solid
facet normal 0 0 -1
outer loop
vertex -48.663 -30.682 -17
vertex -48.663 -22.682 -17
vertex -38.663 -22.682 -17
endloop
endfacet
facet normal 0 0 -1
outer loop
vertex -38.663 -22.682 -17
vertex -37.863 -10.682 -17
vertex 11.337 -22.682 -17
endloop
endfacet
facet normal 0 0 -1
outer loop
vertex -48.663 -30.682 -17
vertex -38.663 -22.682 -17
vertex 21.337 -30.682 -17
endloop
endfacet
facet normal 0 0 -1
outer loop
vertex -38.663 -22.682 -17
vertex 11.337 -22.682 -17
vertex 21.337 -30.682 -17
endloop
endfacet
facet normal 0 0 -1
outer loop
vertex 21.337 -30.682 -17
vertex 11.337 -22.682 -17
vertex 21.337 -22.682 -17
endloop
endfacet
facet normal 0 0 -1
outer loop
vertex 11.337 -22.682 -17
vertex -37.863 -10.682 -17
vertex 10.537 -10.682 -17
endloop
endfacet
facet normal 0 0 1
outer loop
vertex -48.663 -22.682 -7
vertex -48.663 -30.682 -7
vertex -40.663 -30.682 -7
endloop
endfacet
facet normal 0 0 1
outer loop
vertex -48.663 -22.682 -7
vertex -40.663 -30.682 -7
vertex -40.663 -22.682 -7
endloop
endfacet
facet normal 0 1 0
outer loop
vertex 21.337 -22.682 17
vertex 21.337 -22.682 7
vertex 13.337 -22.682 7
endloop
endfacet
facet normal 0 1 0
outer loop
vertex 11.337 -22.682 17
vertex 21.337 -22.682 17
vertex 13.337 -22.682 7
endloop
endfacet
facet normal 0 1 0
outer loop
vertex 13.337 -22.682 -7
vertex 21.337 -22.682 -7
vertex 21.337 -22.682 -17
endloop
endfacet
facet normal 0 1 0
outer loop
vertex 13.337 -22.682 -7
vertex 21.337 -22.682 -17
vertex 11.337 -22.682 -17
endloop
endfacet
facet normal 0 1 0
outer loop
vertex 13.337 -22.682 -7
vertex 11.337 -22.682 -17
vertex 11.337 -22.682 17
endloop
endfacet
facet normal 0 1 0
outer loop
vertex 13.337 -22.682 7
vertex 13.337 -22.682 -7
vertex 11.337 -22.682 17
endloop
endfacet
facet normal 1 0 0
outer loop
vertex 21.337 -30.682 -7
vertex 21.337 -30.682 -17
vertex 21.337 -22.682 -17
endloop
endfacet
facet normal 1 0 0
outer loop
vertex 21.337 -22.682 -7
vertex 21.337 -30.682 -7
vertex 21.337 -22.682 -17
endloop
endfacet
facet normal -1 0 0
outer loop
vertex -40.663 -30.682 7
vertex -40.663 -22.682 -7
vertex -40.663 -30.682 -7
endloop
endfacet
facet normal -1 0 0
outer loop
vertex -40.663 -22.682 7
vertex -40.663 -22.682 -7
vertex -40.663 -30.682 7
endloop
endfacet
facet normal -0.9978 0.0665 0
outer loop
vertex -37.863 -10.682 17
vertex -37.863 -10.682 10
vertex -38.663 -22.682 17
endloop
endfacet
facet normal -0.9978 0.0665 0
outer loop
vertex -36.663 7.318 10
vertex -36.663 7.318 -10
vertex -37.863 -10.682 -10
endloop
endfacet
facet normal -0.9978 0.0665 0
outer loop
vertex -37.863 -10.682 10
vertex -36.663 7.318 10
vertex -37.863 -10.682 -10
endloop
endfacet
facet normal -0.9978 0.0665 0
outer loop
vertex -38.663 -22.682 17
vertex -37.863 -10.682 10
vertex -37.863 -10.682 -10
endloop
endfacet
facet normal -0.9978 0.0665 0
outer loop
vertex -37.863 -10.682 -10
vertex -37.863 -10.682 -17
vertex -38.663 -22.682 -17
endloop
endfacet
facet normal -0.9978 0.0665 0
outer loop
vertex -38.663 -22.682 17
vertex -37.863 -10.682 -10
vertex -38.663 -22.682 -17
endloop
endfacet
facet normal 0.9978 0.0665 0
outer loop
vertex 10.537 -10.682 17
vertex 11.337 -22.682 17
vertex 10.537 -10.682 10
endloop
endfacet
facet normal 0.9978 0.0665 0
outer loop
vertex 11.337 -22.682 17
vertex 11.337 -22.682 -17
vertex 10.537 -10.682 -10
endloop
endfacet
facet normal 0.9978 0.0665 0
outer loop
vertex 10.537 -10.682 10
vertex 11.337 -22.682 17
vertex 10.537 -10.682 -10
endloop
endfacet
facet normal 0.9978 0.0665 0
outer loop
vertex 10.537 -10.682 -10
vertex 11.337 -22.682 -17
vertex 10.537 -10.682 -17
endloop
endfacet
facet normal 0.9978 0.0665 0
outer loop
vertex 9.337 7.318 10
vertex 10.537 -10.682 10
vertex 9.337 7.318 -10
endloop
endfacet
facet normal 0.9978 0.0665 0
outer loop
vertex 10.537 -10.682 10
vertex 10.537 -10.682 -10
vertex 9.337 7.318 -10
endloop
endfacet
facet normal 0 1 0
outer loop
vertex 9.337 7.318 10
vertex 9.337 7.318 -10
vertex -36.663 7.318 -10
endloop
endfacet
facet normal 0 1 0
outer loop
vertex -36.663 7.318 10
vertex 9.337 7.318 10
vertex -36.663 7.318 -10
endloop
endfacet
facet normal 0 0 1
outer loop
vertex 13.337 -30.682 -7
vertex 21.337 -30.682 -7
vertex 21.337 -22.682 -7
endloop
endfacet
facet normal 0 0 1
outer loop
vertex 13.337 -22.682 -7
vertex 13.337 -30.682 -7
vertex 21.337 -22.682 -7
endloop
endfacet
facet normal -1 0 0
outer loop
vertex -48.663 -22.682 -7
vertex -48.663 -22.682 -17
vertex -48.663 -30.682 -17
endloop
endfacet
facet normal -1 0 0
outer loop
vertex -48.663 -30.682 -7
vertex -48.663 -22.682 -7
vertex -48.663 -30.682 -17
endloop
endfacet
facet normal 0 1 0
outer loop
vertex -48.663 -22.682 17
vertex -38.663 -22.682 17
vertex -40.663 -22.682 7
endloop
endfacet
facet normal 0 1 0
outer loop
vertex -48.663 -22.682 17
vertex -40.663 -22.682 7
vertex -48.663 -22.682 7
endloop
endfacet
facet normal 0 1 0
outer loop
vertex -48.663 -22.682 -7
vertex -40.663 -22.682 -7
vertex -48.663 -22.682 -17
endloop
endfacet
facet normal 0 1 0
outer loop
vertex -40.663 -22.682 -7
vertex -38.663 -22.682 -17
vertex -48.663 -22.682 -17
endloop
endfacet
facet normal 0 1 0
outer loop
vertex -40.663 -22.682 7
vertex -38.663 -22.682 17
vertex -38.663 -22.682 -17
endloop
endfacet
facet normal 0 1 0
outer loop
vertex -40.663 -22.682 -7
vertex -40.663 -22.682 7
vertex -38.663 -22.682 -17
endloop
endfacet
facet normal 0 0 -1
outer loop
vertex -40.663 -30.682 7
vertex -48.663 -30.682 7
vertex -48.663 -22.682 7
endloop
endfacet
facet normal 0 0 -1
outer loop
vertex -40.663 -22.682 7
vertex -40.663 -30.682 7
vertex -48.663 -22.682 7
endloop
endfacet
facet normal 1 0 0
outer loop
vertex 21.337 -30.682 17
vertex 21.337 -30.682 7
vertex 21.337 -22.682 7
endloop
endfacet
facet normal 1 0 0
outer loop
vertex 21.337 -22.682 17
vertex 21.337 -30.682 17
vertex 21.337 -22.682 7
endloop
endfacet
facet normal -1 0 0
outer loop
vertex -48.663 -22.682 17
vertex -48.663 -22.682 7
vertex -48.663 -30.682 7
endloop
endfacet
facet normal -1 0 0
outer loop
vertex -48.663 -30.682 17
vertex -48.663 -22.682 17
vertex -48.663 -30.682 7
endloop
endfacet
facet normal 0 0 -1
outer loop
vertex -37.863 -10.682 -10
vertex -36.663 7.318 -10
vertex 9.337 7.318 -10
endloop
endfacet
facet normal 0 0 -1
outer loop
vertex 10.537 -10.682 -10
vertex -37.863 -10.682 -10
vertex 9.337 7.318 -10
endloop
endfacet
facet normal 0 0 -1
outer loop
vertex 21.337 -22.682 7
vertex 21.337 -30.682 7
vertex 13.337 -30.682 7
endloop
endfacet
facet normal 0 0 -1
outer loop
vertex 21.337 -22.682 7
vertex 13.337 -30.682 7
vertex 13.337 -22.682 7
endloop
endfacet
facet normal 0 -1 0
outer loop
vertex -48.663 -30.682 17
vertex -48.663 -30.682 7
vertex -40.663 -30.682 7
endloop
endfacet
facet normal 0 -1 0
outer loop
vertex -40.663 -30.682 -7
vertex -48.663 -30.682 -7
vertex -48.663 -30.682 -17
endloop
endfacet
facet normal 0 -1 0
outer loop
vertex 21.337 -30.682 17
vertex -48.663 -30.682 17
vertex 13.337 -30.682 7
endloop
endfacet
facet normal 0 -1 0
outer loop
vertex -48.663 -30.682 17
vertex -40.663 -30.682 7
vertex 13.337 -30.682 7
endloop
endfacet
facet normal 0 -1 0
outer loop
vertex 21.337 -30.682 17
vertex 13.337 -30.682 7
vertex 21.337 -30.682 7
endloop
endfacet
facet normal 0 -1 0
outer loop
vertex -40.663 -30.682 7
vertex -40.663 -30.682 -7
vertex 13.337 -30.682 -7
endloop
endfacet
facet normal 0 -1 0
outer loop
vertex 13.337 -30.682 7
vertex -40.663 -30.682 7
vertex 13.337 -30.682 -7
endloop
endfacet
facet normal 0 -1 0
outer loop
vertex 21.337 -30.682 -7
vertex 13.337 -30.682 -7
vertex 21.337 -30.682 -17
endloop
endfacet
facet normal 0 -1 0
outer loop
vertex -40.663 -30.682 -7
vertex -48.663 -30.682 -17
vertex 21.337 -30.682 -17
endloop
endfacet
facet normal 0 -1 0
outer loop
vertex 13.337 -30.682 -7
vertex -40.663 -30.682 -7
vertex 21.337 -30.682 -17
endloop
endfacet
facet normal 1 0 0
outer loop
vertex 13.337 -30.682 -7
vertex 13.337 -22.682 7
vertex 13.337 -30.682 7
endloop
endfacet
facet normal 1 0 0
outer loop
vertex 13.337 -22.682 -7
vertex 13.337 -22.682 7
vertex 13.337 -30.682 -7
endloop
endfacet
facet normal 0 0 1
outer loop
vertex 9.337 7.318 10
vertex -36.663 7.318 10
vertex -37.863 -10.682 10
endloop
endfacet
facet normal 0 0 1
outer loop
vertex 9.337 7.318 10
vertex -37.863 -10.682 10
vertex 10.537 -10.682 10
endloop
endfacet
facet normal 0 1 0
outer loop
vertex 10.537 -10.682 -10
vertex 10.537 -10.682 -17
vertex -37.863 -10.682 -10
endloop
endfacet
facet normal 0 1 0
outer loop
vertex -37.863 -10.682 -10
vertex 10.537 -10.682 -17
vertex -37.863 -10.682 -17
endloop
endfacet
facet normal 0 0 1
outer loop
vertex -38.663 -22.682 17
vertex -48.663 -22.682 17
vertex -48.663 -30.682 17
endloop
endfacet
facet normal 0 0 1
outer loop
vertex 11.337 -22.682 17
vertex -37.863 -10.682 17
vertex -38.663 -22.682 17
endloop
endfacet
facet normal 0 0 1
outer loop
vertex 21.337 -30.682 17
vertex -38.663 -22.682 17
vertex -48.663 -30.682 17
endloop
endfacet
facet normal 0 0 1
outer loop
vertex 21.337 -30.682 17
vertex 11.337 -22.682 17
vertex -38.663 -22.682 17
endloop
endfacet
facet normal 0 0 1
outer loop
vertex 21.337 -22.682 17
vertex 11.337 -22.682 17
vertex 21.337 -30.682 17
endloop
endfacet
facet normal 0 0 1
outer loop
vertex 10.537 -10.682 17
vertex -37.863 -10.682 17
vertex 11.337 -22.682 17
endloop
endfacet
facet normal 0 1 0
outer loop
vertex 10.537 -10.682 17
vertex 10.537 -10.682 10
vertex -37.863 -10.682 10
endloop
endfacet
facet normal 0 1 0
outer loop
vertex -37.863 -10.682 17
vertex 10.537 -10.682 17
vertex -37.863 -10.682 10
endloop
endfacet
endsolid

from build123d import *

# Parameters (mm, degrees)
BOSS_EXTRUDE1_DEPTH      = 17
BOSS_EXTRUDE1_DEPTH_BACK = 17
BOSS_EXTRUDE2_DEPTH      = 10
BOSS_EXTRUDE2_DEPTH_BACK = 10
SKETCH3_W                = 14
SKETCH3_H                = 8
CUT_EXTRUDE1_DEPTH       = 8
SKETCH4_W                = 14
SKETCH4_H                = 8
CUT_EXTRUDE2_DEPTH       = 8


with BuildPart() as part:
    # Sketch1 → Boss-Extrude1 (new, two sides: drawn at the far end of the back side and taken through both)
    with BuildSketch(Plane.XY.offset(-BOSS_EXTRUDE1_DEPTH_BACK)):
        Polygon((-37.863126543, -10.682367572), (-38.663126543, -22.682367572), (-48.663126543, -22.682367572), (-48.663126543, -30.682367572), (21.336873457, -30.682367572), (21.336873457, -22.682367572), (11.336873457, -22.682367572), (10.536873457, -10.682367572), align=None)
    extrude(amount=BOSS_EXTRUDE1_DEPTH + BOSS_EXTRUDE1_DEPTH_BACK)

    # Sketch1<3> → Boss-Extrude2 (add, two sides: drawn at the far end of the back side and taken through both)
    with BuildSketch(Plane.XY.offset(-BOSS_EXTRUDE2_DEPTH_BACK)):
        Polygon((-36.663126543, 7.317632428), (-37.863126543, -10.682367572), (10.536873457, -10.682367572), (9.336873457, 7.317632428), align=None)
    extrude(amount=BOSS_EXTRUDE2_DEPTH + BOSS_EXTRUDE2_DEPTH_BACK)

    # Sketch3 → Cut-Extrude1 (cut)
    with BuildSketch(Plane(origin=(21.336873457, 0, 0), x_dir=(0, 0, -1), z_dir=(1, 0, 0))):
        with Locations((0, -26.682367572)):
            Rectangle(SKETCH3_W, SKETCH3_H)
    extrude(amount=-CUT_EXTRUDE1_DEPTH, mode=Mode.SUBTRACT)

    # Sketch4 → Cut-Extrude2 (cut)
    with BuildSketch(Plane.ZY.offset(48.663126543)):
        with Locations((0, -26.682367572)):
            Rectangle(SKETCH4_W, SKETCH4_H)
    extrude(amount=-CUT_EXTRUDE2_DEPTH, mode=Mode.SUBTRACT)


solid = part.part
